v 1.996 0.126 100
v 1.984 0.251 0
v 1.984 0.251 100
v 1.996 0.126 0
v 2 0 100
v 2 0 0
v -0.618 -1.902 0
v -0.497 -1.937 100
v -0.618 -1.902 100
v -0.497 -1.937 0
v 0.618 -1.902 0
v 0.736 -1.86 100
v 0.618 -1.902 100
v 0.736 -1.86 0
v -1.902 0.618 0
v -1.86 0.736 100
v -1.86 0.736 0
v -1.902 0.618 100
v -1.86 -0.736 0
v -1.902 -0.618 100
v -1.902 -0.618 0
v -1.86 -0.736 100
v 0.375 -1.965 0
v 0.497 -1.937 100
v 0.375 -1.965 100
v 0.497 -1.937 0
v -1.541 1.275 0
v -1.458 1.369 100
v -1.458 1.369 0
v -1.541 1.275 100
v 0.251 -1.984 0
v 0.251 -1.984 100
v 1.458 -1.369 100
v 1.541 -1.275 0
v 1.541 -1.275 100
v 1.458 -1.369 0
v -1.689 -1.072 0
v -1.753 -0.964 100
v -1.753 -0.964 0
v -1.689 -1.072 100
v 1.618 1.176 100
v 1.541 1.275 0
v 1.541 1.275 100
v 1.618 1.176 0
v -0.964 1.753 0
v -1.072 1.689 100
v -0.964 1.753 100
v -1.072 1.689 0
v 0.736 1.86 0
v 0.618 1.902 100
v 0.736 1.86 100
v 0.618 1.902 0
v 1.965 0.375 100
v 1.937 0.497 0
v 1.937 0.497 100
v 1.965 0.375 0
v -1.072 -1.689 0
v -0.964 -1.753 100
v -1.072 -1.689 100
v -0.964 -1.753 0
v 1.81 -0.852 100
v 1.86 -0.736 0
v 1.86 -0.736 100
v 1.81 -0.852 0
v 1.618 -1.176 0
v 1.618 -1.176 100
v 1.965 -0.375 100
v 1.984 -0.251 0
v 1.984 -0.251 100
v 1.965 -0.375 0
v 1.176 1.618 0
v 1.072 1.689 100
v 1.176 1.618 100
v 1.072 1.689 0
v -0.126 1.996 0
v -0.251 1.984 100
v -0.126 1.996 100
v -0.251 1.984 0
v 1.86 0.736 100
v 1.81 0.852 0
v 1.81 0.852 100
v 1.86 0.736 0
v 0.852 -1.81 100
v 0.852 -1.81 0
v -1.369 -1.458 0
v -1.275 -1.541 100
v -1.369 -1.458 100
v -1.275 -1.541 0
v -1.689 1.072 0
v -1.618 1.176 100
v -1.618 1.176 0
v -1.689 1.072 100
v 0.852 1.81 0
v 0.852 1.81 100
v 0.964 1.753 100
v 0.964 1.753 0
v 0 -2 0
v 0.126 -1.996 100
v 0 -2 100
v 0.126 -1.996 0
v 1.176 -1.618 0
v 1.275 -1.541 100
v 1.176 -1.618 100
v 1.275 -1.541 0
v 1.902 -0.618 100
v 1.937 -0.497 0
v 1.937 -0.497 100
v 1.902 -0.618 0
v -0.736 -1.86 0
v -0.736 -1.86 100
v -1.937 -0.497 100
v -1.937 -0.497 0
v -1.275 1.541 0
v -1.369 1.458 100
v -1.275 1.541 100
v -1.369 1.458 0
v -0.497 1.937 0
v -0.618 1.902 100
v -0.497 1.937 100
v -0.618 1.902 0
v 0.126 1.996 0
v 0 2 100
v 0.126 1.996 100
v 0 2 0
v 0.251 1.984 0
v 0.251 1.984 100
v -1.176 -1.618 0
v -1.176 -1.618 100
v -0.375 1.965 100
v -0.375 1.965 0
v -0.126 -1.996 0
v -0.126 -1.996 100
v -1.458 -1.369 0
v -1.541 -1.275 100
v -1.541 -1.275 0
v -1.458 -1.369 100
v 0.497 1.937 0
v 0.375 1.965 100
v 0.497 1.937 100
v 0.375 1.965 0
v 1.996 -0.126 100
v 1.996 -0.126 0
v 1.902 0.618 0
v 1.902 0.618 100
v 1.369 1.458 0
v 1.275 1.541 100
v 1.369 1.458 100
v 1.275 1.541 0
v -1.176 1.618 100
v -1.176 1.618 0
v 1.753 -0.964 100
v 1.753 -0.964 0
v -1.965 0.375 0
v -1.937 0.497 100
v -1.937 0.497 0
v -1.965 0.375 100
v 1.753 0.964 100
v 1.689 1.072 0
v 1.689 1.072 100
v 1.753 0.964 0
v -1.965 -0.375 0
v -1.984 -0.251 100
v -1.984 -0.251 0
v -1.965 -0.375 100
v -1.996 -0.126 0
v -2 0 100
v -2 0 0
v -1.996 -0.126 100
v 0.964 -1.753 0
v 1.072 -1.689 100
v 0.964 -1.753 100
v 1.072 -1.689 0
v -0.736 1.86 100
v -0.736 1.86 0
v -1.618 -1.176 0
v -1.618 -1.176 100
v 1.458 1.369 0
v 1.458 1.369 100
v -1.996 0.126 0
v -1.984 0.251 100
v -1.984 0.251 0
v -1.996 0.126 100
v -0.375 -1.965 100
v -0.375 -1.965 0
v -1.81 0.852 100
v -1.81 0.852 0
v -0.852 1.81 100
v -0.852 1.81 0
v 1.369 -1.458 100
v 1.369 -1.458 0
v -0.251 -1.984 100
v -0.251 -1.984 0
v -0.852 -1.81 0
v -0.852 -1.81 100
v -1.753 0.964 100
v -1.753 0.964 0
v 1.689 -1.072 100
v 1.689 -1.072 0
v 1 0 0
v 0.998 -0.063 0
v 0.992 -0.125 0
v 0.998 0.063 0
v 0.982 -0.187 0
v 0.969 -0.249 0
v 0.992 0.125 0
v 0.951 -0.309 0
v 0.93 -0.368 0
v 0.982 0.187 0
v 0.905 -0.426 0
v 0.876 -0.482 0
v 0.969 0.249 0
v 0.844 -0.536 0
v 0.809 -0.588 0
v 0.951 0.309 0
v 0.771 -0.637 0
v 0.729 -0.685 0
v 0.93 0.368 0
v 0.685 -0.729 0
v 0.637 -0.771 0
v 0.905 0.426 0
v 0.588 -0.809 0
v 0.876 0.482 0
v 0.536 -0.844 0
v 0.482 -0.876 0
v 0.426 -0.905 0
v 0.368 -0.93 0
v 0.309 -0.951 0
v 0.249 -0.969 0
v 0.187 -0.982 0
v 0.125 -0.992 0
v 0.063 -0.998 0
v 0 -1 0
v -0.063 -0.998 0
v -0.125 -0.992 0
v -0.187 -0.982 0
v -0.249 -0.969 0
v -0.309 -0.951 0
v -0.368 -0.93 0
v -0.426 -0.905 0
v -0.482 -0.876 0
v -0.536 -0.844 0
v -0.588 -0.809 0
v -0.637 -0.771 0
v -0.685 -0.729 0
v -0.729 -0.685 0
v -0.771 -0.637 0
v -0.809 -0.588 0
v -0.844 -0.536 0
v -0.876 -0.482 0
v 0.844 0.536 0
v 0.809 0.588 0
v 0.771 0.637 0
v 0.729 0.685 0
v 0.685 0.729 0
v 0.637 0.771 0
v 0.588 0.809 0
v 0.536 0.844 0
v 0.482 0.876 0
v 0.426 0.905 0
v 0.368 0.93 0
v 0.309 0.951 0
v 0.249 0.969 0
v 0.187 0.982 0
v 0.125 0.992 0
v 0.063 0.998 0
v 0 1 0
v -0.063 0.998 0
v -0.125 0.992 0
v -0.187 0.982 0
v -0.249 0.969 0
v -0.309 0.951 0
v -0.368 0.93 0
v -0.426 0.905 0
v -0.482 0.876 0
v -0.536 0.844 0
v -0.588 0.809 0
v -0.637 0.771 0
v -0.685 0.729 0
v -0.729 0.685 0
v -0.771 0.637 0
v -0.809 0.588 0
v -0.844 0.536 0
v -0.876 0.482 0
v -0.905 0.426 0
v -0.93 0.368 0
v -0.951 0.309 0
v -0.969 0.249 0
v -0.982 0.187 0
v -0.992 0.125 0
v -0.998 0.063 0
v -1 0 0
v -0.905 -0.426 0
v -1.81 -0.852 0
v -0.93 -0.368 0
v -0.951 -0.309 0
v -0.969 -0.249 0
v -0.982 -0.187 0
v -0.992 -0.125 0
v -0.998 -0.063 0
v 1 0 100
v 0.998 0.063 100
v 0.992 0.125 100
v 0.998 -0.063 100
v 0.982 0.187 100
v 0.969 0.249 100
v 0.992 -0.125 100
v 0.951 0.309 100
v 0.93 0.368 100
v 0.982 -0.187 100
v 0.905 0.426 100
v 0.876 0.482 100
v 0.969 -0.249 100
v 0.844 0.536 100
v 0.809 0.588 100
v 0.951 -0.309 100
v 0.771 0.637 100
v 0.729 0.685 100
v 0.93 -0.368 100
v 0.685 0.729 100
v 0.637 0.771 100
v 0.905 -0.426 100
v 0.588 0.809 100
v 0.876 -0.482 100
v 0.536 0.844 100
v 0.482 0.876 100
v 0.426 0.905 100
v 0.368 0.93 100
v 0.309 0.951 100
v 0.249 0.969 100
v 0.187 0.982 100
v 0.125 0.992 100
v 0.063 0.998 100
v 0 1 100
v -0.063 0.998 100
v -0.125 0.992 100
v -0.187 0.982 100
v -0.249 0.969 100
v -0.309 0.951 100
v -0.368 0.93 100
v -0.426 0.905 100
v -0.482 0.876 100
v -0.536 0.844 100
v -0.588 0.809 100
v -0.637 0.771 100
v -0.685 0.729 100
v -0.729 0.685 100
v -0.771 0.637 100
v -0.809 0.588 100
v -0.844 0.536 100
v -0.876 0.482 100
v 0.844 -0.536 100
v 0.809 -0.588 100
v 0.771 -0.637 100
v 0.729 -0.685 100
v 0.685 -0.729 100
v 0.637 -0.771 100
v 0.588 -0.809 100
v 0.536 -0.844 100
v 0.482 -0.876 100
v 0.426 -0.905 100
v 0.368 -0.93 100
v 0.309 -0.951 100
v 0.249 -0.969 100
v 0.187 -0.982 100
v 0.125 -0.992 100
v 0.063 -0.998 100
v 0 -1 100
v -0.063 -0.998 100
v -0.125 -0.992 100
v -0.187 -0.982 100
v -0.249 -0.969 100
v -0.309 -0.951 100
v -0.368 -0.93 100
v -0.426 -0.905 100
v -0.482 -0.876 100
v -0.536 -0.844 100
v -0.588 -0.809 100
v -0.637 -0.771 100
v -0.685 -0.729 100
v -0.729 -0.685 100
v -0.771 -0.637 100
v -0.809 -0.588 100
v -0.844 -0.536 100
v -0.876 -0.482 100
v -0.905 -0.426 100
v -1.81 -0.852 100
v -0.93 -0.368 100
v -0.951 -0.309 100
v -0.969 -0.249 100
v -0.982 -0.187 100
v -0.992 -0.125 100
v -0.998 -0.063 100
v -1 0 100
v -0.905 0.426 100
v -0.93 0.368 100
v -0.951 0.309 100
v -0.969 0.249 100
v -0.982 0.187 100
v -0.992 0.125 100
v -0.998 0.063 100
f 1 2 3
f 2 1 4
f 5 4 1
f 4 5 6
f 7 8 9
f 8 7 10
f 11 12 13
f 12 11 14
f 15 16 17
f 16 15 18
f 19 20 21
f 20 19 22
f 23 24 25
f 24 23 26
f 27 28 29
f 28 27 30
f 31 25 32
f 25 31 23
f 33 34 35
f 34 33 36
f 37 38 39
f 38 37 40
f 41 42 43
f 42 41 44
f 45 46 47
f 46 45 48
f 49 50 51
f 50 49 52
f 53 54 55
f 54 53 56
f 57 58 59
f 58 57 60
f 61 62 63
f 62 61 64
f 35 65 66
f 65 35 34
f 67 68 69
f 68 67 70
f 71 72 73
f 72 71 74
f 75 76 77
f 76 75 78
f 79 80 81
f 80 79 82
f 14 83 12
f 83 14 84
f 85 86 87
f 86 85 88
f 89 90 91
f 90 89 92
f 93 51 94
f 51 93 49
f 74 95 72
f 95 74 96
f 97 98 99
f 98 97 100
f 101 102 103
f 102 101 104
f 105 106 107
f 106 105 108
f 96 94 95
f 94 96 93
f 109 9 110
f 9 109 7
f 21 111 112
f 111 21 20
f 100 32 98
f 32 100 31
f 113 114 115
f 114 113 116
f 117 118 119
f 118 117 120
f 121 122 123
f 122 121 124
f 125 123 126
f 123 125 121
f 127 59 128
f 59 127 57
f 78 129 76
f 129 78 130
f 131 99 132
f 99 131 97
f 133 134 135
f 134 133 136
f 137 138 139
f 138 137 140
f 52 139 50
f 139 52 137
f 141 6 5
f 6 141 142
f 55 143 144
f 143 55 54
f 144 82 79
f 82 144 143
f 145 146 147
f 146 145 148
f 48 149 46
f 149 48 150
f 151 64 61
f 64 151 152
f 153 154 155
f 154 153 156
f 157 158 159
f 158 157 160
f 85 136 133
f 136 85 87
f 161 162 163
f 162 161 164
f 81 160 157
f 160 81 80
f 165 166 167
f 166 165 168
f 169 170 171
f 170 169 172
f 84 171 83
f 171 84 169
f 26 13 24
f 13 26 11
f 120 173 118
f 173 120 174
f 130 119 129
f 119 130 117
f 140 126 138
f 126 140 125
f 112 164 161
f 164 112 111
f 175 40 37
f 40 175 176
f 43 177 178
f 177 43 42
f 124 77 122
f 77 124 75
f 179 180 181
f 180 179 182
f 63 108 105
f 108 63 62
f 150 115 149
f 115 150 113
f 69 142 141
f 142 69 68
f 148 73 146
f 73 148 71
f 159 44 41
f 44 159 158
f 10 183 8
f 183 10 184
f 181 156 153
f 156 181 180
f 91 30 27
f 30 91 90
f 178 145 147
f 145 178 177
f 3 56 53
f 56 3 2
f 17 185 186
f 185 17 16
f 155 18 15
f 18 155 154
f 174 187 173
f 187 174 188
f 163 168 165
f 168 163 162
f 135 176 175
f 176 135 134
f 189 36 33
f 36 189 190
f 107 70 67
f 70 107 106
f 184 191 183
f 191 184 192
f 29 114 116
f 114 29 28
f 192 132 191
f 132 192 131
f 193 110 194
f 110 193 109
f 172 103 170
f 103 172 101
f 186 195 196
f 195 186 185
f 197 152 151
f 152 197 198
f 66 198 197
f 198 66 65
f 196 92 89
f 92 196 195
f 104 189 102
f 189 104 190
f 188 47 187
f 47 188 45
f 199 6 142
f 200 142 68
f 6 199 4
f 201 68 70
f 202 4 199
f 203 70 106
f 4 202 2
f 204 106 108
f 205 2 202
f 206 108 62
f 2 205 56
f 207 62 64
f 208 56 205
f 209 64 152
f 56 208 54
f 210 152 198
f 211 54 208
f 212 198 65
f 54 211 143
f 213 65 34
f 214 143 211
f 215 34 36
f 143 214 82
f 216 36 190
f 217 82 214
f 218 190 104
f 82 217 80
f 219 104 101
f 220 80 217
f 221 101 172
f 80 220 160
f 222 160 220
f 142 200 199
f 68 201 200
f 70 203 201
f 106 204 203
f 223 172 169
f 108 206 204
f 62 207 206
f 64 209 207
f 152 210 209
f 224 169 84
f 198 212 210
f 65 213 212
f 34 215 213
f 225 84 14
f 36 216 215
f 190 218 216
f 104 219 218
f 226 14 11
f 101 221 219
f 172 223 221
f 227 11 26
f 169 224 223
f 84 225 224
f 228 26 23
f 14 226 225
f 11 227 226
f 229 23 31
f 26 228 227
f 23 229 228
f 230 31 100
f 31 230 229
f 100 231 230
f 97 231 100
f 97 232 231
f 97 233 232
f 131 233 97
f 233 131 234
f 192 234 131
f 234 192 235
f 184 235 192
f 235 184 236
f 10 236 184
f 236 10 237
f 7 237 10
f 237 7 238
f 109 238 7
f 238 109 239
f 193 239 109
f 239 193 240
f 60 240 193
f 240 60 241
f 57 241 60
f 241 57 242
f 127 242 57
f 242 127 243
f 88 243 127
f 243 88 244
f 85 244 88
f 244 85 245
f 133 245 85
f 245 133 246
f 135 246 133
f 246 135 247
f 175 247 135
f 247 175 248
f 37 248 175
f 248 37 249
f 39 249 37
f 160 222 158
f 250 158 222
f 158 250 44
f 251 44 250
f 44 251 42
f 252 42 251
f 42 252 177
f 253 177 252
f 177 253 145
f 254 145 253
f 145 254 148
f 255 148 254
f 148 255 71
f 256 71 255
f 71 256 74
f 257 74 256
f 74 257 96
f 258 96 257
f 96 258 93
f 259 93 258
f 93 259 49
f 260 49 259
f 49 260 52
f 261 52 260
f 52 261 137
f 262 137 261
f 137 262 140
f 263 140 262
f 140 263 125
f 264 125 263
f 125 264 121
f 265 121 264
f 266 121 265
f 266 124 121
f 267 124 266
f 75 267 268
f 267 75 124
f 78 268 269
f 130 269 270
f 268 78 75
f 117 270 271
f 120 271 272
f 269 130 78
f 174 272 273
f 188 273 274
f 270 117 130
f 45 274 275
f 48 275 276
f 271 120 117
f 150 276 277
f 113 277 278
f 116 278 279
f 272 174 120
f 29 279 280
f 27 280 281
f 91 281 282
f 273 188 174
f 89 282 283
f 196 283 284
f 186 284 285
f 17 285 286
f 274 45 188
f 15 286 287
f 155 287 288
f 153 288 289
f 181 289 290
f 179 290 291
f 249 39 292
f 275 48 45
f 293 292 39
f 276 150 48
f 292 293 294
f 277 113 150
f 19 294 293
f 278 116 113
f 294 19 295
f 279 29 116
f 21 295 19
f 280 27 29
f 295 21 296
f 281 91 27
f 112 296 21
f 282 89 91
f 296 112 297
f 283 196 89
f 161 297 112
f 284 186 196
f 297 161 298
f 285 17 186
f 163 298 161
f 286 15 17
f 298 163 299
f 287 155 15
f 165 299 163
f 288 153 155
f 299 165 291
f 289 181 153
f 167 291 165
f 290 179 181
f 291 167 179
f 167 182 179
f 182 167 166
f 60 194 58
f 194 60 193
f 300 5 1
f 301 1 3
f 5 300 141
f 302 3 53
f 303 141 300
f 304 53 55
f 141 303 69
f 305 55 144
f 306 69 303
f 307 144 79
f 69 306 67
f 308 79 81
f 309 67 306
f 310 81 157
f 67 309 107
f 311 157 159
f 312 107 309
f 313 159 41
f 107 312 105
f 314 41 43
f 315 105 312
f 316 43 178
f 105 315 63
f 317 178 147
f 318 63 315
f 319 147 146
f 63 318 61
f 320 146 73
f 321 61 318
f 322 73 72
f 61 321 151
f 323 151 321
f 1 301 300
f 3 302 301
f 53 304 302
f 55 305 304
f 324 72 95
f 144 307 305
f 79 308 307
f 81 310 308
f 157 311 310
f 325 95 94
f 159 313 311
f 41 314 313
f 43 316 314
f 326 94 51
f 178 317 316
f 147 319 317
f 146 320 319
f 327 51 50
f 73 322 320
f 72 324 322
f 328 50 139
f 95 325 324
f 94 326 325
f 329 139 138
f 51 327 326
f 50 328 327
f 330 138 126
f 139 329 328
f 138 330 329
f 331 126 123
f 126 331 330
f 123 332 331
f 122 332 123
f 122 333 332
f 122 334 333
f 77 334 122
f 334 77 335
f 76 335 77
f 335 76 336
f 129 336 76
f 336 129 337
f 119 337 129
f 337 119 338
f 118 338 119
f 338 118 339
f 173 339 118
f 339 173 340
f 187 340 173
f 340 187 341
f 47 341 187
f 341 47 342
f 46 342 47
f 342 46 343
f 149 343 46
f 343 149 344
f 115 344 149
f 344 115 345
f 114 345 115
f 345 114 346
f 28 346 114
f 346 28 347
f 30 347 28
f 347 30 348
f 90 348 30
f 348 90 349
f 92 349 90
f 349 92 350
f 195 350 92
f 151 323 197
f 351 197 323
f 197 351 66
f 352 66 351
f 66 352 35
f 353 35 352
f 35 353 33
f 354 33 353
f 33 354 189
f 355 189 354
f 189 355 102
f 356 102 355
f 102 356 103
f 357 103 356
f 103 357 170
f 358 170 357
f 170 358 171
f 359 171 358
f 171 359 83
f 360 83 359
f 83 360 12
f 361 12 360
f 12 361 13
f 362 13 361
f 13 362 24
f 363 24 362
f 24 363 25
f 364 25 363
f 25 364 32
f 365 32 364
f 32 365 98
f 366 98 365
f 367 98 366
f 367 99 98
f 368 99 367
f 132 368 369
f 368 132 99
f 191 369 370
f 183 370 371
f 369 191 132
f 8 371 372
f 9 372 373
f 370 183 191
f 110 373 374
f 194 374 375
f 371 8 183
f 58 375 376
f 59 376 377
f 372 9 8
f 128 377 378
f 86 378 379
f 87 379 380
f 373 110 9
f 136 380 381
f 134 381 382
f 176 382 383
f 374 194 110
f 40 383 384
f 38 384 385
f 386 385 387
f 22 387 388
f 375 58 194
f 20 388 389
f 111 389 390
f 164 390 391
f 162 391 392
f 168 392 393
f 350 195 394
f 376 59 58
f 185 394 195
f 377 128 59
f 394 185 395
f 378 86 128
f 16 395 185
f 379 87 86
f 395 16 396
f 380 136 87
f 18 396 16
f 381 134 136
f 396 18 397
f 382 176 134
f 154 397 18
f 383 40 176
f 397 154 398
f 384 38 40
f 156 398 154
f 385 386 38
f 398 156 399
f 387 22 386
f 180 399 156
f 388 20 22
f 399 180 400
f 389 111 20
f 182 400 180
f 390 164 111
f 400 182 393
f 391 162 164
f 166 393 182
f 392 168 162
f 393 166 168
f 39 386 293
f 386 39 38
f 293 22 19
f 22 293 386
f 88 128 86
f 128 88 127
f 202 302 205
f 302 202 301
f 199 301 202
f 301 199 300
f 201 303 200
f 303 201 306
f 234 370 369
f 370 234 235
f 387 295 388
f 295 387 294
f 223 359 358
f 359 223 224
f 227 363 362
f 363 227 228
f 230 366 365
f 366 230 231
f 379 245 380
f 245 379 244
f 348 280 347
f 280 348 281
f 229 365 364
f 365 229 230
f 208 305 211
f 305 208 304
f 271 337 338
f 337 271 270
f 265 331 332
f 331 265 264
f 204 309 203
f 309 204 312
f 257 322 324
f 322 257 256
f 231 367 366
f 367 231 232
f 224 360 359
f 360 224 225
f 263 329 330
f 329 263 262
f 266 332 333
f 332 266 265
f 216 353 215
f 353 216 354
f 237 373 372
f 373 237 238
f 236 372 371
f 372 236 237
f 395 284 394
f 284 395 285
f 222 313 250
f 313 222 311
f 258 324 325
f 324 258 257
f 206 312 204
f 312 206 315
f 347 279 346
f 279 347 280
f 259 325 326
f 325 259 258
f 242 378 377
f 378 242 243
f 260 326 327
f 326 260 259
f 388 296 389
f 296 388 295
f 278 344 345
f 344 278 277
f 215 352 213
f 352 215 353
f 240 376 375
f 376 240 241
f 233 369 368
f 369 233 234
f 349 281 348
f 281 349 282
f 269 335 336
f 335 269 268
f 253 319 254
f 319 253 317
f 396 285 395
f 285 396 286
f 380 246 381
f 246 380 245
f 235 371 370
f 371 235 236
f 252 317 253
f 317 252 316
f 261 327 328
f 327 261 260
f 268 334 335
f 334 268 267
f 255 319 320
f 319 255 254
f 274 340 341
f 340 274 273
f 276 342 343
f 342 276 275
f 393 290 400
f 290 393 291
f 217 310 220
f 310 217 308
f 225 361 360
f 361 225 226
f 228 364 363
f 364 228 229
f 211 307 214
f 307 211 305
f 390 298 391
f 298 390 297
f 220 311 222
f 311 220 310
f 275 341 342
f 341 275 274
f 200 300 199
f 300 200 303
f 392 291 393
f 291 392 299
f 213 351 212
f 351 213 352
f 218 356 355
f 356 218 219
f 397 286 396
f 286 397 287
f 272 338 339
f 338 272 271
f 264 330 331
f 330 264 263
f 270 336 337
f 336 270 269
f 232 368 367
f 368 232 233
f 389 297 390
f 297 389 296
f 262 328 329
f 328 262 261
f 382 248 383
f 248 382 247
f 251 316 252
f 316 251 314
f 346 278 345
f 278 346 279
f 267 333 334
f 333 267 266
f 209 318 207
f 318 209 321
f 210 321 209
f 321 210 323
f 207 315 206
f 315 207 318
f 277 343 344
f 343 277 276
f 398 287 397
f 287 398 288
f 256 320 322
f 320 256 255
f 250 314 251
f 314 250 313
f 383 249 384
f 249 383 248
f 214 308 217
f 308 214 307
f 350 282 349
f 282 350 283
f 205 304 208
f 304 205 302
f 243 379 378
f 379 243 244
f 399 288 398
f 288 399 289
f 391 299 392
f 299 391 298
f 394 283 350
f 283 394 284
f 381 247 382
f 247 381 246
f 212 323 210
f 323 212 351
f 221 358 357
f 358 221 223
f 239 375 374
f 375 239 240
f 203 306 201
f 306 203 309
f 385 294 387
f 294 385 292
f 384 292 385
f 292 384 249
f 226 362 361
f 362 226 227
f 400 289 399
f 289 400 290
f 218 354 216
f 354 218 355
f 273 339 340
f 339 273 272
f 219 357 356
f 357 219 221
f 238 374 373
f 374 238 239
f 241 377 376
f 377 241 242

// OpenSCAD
// PTFE tubing parameters
inner_diameter = 2.0; // Inner diameter in mm
outer_diameter = 4.0; // Outer diameter in mm
length = 100.0; // Length of the tubing in mm

// Material properties for PTFE (for reference, not used in rendering)
ptfe_density = 2.2; // g/cm^3
ptfe_color = [0.9, 0.9, 0.9]; // Approximate color for PTFE

// Function to create the tubing body
module tubing_body(inner_d, outer_d, len) {
    difference() {
        cylinder(h = len, d = outer_d, $fn = 100);
        translate([0, 0, -1]) // Slightly extend the inner cylinder to ensure proper subtraction
            cylinder(h = len + 2, d = inner_d, $fn = 100);
    }
}

// Main tubing module
module tubing() {
    color(ptfe_color)
        tubing_body(inner_diameter, outer_diameter, length);
}

// Render the tubing
tubing();
